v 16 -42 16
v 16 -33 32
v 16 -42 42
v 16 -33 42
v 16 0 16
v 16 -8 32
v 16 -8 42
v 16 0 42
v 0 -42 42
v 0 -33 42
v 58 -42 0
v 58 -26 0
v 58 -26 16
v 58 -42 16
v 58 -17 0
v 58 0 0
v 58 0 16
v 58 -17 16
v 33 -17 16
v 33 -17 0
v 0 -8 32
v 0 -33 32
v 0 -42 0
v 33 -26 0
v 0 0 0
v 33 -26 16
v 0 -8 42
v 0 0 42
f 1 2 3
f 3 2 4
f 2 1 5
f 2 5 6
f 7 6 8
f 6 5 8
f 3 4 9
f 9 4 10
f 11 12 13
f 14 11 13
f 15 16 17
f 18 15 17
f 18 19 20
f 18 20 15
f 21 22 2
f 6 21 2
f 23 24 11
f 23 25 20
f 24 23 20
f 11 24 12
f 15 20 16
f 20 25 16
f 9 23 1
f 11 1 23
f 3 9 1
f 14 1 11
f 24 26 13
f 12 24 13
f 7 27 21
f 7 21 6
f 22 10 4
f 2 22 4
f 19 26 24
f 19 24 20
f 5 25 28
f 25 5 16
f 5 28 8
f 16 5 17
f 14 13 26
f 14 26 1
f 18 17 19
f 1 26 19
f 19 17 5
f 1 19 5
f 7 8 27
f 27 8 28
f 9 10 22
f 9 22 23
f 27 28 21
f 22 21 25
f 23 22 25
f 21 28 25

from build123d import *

# Parameters (mm, degrees)
F1_DEPTH = 42
F2_W     = 16
F2_H     = 25
F3_DEPTH = 10
F4_W     = 25
F4_H     = 9
F5_DEPTH = 16.001


with BuildPart() as f1:
    # F0 (on Front) → F1 (new body)
    with BuildSketch(Plane.XZ):
        Polygon((0, 42), (0, 0), (58, 0), (58, 16), (16, 16), (16, 42), align=None)
    extrude(amount=F1_DEPTH)

    # F2 (on face) → F3 (cut)
    with BuildSketch(Plane.XY.offset(42)):
        with Locations((8, -20.5)):
            Rectangle(F2_W, F2_H)
    extrude(amount=-F3_DEPTH, mode=Mode.SUBTRACT)

    # F4 (on face) → F5 (cut, through all)
    with BuildSketch(Plane.XY.offset(16)):
        with Locations((45.5, -21.5)):
            Rectangle(F4_W, F4_H)
    extrude(amount=-F5_DEPTH, mode=Mode.SUBTRACT)


solid = f1.part
